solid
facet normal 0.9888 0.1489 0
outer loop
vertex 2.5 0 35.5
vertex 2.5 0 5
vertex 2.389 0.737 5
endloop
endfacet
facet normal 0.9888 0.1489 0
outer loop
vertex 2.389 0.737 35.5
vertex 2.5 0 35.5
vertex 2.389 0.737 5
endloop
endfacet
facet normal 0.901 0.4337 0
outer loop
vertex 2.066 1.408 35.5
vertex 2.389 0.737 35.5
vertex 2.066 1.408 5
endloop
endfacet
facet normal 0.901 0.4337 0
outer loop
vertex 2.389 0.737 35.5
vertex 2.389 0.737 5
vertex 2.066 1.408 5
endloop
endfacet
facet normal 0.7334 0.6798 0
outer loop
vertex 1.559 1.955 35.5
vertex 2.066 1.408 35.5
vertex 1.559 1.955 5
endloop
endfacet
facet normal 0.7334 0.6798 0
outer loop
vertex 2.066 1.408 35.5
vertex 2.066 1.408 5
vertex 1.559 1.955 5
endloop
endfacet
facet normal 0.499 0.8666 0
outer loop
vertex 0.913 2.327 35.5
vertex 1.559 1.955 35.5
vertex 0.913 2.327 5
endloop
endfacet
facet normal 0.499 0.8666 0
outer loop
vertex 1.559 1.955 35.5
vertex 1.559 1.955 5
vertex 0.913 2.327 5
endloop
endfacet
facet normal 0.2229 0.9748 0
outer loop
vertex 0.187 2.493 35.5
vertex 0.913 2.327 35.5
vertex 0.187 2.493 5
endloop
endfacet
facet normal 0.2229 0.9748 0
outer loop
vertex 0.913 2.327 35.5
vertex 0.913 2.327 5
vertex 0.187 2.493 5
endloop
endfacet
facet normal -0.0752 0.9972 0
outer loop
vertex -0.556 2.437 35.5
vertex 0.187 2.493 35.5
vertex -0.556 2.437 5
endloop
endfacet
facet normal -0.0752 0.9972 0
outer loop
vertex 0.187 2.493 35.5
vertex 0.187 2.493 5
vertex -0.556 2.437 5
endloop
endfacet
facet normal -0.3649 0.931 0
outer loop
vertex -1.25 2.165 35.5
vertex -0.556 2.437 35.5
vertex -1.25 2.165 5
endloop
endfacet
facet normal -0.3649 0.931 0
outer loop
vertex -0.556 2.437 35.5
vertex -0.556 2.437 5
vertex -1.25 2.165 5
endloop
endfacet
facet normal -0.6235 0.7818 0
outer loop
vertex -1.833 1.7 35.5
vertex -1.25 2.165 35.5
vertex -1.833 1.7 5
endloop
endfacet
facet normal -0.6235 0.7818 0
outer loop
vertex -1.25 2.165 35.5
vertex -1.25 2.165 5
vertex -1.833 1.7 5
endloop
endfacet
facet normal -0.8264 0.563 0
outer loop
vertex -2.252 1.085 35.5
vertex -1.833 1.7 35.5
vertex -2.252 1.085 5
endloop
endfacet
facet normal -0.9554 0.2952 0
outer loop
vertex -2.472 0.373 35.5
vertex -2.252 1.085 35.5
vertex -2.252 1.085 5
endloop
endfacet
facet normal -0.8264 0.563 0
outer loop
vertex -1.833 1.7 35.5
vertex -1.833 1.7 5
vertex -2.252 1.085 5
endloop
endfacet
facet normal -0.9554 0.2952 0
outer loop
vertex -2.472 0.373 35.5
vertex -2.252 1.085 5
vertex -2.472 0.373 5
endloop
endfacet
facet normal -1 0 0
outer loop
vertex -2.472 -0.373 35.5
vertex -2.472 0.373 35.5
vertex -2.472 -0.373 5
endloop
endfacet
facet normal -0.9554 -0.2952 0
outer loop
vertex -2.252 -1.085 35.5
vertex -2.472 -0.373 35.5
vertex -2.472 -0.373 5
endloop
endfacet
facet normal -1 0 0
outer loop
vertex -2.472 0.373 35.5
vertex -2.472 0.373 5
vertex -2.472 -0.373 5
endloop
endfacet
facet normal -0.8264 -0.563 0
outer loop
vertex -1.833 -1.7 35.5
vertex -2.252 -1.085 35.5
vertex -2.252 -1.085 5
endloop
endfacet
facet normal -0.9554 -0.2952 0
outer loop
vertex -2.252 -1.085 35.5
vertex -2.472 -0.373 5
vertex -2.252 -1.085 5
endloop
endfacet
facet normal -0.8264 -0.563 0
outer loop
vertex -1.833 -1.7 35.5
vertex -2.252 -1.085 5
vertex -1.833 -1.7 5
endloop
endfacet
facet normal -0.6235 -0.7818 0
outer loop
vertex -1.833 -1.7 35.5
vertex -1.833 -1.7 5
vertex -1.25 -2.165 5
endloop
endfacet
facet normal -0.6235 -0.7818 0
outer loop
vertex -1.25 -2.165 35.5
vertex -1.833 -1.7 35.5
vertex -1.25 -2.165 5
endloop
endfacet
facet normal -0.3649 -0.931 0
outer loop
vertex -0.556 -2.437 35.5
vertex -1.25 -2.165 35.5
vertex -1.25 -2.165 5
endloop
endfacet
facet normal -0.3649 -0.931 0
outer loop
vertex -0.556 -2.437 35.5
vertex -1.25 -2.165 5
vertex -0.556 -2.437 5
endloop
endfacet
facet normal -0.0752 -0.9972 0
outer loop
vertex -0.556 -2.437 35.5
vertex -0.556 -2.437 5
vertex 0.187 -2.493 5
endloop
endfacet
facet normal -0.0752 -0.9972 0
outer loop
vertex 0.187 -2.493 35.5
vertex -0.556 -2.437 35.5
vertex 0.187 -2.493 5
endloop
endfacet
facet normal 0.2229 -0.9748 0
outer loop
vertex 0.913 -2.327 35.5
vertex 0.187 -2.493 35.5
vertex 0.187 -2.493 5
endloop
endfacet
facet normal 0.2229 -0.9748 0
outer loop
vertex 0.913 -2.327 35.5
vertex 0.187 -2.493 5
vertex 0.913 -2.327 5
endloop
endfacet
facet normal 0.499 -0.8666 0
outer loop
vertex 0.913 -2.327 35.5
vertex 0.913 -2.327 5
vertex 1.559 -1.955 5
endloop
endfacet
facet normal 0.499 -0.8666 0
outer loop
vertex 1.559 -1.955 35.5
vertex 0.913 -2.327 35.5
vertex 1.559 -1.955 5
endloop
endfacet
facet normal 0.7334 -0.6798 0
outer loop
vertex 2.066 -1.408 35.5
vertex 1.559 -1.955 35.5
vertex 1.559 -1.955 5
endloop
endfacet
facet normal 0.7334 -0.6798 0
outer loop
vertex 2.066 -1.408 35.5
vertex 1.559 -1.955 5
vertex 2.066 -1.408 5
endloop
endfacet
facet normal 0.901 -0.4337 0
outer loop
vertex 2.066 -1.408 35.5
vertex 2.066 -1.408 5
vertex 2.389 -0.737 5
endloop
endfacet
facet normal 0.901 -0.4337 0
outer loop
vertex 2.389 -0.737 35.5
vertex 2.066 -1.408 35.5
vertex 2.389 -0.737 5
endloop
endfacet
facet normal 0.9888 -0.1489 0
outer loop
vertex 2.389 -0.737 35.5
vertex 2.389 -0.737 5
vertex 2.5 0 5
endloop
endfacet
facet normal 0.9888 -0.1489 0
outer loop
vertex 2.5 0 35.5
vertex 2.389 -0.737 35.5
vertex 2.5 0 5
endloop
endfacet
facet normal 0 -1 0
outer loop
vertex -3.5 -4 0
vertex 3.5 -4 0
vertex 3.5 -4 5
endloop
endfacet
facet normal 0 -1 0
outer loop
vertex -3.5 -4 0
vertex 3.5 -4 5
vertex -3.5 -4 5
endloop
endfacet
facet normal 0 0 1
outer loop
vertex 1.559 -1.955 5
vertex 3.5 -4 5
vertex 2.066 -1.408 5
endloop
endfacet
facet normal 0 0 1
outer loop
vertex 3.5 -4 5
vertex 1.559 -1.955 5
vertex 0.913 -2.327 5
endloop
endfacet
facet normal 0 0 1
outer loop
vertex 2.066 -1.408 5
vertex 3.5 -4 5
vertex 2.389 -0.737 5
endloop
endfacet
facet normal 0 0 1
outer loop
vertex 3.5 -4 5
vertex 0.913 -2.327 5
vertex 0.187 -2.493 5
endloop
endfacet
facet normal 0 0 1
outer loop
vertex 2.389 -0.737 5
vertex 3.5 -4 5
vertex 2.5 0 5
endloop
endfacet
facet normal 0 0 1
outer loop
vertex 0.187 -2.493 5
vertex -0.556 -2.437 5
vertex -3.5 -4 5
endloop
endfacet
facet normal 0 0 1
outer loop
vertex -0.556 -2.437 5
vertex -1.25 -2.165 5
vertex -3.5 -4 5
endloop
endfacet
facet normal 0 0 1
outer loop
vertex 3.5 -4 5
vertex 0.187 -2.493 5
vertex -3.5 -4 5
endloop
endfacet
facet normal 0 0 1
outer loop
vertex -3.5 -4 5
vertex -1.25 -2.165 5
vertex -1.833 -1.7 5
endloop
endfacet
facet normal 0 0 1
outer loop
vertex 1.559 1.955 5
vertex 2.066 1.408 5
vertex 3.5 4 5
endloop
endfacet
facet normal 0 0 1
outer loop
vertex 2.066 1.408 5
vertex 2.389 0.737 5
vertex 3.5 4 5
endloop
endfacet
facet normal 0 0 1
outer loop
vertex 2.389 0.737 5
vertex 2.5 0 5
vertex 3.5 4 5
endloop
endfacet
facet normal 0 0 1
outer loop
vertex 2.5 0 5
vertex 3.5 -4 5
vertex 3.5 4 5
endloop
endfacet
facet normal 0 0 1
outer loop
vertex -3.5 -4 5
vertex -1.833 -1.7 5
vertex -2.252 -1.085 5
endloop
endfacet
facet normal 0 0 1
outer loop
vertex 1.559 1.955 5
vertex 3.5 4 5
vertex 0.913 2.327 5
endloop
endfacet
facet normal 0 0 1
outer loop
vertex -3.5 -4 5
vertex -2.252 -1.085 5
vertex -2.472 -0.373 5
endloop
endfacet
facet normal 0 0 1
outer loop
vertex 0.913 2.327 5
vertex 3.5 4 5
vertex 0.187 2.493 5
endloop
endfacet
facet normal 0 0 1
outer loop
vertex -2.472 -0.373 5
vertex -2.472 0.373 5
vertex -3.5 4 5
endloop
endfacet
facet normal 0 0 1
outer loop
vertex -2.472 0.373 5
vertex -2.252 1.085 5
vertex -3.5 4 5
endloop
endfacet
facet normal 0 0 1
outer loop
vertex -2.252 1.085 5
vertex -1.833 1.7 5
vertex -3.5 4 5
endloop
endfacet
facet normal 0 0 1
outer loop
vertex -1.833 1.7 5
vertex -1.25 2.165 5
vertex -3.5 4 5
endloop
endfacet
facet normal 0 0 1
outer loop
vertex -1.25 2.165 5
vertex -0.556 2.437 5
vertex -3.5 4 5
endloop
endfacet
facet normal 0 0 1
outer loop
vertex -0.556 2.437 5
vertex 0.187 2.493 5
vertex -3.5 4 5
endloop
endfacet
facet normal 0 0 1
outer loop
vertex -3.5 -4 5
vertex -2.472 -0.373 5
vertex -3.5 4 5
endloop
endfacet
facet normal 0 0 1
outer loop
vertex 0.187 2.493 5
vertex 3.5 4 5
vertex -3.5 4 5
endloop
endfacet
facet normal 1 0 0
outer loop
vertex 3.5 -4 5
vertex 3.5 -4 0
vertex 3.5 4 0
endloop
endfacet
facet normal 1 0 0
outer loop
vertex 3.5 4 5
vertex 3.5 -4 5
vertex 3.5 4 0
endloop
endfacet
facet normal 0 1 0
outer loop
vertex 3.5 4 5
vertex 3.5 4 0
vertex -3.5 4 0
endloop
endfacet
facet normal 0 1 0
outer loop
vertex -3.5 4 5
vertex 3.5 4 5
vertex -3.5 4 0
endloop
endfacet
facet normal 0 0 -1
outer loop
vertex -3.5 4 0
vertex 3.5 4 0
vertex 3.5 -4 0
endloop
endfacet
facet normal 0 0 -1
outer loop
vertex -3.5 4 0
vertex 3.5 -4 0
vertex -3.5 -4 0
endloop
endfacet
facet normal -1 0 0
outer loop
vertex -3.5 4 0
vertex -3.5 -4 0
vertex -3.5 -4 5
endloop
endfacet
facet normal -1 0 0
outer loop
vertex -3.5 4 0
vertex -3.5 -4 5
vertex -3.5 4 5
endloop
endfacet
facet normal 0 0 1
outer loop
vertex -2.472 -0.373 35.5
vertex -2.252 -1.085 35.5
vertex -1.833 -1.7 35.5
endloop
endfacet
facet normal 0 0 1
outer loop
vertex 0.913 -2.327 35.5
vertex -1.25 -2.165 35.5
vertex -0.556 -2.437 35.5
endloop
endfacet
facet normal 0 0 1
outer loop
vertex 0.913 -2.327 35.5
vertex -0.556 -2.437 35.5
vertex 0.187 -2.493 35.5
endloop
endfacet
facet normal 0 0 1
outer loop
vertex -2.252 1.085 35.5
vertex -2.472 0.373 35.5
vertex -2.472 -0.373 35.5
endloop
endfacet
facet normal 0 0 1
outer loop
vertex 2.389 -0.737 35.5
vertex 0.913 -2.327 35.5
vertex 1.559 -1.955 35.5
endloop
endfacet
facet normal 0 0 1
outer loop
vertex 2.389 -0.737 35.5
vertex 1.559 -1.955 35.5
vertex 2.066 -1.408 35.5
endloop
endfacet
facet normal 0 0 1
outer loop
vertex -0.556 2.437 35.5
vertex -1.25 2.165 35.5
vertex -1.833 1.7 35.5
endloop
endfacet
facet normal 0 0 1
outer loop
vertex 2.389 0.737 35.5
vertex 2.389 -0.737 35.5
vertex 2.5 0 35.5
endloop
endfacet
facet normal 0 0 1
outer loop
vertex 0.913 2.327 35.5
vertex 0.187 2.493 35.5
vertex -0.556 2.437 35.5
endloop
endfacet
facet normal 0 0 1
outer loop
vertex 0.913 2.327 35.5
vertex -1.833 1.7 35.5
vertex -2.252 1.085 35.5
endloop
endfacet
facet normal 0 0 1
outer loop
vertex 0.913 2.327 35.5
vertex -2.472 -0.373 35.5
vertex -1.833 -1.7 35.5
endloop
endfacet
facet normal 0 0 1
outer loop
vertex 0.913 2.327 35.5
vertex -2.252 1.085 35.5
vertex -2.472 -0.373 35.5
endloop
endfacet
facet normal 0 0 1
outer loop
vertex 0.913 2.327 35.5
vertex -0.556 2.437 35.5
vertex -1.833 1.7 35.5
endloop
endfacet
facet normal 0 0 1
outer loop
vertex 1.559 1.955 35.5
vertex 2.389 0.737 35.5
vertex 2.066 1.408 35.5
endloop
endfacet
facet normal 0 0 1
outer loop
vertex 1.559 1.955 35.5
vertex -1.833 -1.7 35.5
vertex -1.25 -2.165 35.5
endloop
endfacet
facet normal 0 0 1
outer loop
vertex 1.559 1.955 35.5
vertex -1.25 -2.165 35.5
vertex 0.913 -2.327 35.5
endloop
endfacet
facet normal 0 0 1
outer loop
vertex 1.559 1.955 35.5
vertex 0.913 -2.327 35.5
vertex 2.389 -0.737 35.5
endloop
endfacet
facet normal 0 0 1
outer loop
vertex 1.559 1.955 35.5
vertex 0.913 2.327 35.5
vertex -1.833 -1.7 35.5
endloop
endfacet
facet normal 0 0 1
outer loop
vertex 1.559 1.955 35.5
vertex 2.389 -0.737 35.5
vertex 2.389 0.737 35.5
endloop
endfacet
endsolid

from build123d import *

# Parameters (mm, degrees)
SKETCH2_R           = 2.5
BOSS_EXTRUDE1_DEPTH = 35.5
SKETCH4_W           = 7
SKETCH4_H           = 8
BOSS_EXTRUDE4_DEPTH = 5


with BuildPart() as part:
    # Sketch2 → Boss-Extrude1 (new body)
    with BuildSketch(Plane.XY):
        Circle(SKETCH2_R)
    extrude(amount=BOSS_EXTRUDE1_DEPTH)

    # Sketch4 → Boss-Extrude4 (add)
    with BuildSketch(Plane(origin=(0, 0, 0), x_dir=(-1, 0, 0), z_dir=(0, 0, -1))):
        Rectangle(SKETCH4_W, SKETCH4_H)
    extrude(amount=-BOSS_EXTRUDE4_DEPTH)


solid = part.part
